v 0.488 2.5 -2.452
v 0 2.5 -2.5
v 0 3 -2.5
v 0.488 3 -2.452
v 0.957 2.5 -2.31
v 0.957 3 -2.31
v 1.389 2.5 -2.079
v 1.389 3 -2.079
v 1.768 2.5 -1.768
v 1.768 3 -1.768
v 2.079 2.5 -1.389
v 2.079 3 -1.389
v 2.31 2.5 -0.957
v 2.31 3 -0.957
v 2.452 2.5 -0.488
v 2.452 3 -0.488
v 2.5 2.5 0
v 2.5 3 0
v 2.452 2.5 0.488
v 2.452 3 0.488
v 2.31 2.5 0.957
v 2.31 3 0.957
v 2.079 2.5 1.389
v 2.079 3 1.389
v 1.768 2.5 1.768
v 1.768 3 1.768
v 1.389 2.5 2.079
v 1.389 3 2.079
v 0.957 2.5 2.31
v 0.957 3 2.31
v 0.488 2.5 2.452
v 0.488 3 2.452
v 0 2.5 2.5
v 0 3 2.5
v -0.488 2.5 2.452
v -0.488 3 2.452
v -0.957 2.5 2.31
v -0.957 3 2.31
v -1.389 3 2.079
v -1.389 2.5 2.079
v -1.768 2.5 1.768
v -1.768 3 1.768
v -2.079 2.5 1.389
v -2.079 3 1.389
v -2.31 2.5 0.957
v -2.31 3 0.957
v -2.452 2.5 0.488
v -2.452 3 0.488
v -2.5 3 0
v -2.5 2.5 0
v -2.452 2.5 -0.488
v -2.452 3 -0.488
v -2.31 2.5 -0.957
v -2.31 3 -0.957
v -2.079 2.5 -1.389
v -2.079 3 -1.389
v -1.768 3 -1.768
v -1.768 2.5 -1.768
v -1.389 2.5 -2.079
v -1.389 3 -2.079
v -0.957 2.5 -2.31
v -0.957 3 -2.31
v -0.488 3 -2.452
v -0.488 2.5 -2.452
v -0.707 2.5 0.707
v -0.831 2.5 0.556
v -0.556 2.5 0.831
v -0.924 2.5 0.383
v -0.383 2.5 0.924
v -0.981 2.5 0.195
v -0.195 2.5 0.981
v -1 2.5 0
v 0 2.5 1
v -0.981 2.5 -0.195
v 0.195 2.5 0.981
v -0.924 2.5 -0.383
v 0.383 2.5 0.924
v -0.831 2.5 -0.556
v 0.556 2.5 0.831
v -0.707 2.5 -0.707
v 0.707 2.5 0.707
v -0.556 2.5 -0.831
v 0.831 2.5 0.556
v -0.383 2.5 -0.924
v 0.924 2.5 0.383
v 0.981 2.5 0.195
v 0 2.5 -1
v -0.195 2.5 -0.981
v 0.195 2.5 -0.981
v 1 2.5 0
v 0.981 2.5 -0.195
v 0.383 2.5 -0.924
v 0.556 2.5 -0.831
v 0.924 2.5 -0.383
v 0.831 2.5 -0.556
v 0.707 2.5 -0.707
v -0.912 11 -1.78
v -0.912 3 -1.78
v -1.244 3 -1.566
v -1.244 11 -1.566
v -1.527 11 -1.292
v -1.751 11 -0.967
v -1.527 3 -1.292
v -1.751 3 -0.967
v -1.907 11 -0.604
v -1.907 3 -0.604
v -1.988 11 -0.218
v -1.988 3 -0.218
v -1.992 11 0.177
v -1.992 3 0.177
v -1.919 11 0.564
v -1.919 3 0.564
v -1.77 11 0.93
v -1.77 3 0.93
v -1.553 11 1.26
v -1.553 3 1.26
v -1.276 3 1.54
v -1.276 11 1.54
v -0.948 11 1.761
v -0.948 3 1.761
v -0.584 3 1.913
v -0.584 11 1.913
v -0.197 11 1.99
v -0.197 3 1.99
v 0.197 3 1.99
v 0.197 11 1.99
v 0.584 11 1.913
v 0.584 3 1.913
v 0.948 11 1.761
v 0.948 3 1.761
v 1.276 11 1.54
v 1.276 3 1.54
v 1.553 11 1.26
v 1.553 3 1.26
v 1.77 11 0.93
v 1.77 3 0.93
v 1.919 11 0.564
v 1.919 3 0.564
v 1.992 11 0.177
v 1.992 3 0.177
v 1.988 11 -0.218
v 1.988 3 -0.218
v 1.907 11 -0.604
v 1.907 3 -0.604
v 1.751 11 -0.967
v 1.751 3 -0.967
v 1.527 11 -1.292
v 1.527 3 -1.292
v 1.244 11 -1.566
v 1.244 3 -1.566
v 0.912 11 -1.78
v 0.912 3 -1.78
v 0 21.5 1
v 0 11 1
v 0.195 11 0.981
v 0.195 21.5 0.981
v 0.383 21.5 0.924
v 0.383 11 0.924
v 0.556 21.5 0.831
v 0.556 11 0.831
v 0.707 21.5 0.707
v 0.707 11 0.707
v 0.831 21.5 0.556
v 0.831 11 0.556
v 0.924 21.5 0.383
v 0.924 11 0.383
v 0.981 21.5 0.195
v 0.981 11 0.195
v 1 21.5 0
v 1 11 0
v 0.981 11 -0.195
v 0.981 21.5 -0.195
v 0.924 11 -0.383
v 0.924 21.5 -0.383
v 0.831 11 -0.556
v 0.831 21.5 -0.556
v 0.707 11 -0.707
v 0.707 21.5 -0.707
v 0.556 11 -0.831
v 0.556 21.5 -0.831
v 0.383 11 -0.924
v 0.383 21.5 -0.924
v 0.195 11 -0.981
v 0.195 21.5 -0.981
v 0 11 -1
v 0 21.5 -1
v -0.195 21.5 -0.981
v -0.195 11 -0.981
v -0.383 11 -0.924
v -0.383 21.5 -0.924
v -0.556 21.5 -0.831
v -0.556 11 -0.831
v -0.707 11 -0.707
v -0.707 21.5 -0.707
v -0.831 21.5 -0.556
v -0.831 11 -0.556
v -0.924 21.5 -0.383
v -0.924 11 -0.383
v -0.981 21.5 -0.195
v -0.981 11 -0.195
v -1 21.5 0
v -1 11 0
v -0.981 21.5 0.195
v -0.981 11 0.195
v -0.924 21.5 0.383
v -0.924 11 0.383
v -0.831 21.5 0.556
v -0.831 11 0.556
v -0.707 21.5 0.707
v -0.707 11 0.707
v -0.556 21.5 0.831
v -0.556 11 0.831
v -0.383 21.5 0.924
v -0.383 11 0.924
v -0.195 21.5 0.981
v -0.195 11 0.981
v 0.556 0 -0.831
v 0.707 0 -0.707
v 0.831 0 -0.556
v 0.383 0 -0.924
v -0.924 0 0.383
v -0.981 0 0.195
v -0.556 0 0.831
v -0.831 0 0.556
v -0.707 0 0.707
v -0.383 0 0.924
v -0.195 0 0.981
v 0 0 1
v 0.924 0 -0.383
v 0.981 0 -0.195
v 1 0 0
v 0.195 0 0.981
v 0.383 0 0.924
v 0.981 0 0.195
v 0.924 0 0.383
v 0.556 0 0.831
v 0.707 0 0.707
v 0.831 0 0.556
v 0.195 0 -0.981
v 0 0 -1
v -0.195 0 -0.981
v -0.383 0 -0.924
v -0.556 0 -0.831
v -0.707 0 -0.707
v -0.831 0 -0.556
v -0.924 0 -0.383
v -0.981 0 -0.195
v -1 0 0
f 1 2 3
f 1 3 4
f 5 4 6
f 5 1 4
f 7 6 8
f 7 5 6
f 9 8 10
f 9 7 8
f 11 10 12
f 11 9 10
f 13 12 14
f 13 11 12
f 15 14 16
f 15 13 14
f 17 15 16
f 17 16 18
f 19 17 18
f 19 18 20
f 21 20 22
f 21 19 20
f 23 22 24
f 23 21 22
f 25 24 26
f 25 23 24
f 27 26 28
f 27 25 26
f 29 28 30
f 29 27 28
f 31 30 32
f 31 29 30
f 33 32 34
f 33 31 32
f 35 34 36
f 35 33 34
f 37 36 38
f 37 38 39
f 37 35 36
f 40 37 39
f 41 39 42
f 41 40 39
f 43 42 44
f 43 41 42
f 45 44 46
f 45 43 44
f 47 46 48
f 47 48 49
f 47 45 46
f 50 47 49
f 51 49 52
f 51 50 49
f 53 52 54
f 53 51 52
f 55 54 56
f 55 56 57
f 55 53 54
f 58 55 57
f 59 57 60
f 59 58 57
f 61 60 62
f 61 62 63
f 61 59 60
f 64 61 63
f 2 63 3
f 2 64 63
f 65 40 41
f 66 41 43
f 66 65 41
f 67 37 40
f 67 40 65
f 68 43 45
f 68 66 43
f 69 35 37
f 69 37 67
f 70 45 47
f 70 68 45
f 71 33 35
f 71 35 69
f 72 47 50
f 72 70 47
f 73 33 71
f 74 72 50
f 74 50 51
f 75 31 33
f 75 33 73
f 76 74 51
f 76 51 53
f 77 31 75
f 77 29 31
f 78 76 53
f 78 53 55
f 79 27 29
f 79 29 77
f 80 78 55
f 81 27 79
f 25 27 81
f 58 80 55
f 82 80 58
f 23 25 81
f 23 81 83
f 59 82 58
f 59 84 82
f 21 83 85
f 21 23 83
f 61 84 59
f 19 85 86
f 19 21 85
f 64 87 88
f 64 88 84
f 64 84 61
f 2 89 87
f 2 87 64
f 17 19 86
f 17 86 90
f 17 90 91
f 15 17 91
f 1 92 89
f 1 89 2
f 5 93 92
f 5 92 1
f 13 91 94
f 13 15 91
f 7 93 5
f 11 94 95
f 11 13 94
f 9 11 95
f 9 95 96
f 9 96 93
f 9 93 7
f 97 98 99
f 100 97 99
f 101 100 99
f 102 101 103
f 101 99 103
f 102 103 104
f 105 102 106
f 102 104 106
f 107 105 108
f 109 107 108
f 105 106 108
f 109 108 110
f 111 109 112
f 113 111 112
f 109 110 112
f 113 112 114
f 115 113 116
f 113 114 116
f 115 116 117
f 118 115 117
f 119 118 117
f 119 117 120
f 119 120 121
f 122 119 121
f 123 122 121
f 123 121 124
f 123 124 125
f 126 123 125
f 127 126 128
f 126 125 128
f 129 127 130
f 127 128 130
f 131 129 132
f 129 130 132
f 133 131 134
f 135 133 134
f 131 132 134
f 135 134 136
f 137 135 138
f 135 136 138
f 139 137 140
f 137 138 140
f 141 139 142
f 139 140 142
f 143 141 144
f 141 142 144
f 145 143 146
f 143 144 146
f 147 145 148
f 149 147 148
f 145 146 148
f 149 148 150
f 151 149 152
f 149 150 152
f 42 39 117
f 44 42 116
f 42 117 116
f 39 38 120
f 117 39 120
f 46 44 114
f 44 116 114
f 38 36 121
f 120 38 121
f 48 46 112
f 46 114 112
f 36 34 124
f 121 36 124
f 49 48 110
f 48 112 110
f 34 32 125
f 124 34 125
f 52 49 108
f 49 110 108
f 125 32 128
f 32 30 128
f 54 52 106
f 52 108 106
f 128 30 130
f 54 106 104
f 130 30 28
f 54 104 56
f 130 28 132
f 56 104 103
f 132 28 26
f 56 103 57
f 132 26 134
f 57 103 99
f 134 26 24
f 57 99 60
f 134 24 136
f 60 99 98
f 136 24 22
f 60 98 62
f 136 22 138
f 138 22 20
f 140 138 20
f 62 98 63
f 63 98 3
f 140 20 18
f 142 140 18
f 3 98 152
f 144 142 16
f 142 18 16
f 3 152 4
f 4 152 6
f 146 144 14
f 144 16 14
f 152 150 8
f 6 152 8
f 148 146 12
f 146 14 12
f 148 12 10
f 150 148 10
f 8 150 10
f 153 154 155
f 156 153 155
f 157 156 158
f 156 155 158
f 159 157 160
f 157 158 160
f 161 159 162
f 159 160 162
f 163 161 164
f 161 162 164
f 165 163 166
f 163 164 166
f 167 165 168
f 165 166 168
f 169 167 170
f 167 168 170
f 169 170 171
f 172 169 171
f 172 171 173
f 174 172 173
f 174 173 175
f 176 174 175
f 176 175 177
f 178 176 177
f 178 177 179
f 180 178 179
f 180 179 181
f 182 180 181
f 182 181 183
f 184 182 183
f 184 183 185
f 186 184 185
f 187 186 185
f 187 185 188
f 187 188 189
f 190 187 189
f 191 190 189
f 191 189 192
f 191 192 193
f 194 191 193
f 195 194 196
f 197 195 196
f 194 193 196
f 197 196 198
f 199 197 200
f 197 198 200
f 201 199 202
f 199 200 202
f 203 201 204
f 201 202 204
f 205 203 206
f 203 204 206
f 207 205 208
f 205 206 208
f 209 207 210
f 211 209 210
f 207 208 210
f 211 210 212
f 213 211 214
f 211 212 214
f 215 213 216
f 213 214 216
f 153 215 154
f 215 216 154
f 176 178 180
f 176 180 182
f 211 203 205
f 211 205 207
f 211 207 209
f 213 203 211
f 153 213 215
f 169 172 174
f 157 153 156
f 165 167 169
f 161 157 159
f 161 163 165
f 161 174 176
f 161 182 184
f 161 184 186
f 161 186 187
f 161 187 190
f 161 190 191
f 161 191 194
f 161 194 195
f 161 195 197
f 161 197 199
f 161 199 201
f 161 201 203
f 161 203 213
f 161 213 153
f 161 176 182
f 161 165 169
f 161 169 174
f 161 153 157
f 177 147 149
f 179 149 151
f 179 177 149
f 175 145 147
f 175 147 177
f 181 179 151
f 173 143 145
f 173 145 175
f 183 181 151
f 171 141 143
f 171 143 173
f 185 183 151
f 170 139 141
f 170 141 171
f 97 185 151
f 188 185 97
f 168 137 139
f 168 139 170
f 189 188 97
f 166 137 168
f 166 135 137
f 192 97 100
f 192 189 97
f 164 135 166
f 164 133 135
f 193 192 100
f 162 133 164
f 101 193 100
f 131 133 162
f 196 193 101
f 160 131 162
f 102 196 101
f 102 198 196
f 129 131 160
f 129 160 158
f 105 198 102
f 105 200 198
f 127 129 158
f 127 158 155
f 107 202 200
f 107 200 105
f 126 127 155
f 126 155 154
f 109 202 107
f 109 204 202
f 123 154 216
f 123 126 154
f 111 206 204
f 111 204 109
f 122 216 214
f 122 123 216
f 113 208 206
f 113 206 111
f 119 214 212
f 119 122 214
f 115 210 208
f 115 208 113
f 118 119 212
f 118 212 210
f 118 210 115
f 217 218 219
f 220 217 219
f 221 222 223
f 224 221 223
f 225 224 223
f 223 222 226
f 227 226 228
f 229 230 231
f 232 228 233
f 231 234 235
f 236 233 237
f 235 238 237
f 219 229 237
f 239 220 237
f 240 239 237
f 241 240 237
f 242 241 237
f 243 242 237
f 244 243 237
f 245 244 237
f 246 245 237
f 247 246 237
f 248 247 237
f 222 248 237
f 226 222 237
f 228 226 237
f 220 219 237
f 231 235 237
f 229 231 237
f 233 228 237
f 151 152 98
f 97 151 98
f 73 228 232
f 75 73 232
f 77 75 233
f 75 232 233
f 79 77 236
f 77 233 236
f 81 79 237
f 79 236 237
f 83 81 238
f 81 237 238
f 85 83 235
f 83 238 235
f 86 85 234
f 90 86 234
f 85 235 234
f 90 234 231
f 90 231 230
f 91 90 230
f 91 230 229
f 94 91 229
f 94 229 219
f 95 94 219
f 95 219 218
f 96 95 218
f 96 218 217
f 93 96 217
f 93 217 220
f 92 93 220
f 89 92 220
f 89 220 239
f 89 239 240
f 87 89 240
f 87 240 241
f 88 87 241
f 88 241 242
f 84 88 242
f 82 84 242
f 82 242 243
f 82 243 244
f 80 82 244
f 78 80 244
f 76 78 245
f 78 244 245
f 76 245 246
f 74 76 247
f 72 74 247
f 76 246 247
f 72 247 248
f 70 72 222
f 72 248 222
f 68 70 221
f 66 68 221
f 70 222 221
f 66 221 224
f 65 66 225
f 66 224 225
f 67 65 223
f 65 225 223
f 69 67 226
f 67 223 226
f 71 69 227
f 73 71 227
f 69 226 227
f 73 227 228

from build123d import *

# Parameters (mm, degrees)
SKETCH_1_R      = 1
EXTRUDE_1_DEPTH = 21.5
EXTRUDE_START   = -2.5
SKETCH_2_R      = 2.5
SKETCH_2_R_2    = 1
EXTRUDE_2_DEPTH = 0.5
SKETCH_3_R      = 1
EXTRUDE_3_DEPTH = 8


with BuildPart() as part:
    # 草图1 → 凸台-拉伸1 (new body)
    with BuildSketch(Plane(origin=(0, 0, 0), x_dir=(1, 0, 0), z_dir=(0, 1, 0))):
        with Locations(Location((0, 0, 0), (0, 0, 270))):
            Circle(SKETCH_1_R)
    extrude(amount=EXTRUDE_1_DEPTH)

    # 草图2 → 凸台-拉伸2 (add)
    with BuildSketch(Plane.XZ.offset(EXTRUDE_START)):
        with Locations(Location((0, 0, 0), (0, 0, 270))):
            Circle(SKETCH_2_R)
        with Locations(Location((0, 0, 0), (0, 0, 270))):
            Circle(SKETCH_2_R_2, mode=Mode.SUBTRACT)
    extrude(amount=-EXTRUDE_2_DEPTH)

    # 草图3 → 凸台-拉伸3 (add)
    with BuildSketch(Plane(origin=(0, 3, 0), x_dir=(-1, 0, 0), z_dir=(0, 1, 0))):
        with BuildLine():
            Line((-0.911921049, -1.78), (0.911921049, -1.78))
            ThreePointArc((0.911921049, -1.78), (0, 2), (-0.911921049, -1.78))
        make_face()
        with Locations(Location((0, 0, 0), (0, 0, 270))):
            Circle(SKETCH_3_R, mode=Mode.SUBTRACT)
    extrude(amount=EXTRUDE_3_DEPTH)


solid = part.part
